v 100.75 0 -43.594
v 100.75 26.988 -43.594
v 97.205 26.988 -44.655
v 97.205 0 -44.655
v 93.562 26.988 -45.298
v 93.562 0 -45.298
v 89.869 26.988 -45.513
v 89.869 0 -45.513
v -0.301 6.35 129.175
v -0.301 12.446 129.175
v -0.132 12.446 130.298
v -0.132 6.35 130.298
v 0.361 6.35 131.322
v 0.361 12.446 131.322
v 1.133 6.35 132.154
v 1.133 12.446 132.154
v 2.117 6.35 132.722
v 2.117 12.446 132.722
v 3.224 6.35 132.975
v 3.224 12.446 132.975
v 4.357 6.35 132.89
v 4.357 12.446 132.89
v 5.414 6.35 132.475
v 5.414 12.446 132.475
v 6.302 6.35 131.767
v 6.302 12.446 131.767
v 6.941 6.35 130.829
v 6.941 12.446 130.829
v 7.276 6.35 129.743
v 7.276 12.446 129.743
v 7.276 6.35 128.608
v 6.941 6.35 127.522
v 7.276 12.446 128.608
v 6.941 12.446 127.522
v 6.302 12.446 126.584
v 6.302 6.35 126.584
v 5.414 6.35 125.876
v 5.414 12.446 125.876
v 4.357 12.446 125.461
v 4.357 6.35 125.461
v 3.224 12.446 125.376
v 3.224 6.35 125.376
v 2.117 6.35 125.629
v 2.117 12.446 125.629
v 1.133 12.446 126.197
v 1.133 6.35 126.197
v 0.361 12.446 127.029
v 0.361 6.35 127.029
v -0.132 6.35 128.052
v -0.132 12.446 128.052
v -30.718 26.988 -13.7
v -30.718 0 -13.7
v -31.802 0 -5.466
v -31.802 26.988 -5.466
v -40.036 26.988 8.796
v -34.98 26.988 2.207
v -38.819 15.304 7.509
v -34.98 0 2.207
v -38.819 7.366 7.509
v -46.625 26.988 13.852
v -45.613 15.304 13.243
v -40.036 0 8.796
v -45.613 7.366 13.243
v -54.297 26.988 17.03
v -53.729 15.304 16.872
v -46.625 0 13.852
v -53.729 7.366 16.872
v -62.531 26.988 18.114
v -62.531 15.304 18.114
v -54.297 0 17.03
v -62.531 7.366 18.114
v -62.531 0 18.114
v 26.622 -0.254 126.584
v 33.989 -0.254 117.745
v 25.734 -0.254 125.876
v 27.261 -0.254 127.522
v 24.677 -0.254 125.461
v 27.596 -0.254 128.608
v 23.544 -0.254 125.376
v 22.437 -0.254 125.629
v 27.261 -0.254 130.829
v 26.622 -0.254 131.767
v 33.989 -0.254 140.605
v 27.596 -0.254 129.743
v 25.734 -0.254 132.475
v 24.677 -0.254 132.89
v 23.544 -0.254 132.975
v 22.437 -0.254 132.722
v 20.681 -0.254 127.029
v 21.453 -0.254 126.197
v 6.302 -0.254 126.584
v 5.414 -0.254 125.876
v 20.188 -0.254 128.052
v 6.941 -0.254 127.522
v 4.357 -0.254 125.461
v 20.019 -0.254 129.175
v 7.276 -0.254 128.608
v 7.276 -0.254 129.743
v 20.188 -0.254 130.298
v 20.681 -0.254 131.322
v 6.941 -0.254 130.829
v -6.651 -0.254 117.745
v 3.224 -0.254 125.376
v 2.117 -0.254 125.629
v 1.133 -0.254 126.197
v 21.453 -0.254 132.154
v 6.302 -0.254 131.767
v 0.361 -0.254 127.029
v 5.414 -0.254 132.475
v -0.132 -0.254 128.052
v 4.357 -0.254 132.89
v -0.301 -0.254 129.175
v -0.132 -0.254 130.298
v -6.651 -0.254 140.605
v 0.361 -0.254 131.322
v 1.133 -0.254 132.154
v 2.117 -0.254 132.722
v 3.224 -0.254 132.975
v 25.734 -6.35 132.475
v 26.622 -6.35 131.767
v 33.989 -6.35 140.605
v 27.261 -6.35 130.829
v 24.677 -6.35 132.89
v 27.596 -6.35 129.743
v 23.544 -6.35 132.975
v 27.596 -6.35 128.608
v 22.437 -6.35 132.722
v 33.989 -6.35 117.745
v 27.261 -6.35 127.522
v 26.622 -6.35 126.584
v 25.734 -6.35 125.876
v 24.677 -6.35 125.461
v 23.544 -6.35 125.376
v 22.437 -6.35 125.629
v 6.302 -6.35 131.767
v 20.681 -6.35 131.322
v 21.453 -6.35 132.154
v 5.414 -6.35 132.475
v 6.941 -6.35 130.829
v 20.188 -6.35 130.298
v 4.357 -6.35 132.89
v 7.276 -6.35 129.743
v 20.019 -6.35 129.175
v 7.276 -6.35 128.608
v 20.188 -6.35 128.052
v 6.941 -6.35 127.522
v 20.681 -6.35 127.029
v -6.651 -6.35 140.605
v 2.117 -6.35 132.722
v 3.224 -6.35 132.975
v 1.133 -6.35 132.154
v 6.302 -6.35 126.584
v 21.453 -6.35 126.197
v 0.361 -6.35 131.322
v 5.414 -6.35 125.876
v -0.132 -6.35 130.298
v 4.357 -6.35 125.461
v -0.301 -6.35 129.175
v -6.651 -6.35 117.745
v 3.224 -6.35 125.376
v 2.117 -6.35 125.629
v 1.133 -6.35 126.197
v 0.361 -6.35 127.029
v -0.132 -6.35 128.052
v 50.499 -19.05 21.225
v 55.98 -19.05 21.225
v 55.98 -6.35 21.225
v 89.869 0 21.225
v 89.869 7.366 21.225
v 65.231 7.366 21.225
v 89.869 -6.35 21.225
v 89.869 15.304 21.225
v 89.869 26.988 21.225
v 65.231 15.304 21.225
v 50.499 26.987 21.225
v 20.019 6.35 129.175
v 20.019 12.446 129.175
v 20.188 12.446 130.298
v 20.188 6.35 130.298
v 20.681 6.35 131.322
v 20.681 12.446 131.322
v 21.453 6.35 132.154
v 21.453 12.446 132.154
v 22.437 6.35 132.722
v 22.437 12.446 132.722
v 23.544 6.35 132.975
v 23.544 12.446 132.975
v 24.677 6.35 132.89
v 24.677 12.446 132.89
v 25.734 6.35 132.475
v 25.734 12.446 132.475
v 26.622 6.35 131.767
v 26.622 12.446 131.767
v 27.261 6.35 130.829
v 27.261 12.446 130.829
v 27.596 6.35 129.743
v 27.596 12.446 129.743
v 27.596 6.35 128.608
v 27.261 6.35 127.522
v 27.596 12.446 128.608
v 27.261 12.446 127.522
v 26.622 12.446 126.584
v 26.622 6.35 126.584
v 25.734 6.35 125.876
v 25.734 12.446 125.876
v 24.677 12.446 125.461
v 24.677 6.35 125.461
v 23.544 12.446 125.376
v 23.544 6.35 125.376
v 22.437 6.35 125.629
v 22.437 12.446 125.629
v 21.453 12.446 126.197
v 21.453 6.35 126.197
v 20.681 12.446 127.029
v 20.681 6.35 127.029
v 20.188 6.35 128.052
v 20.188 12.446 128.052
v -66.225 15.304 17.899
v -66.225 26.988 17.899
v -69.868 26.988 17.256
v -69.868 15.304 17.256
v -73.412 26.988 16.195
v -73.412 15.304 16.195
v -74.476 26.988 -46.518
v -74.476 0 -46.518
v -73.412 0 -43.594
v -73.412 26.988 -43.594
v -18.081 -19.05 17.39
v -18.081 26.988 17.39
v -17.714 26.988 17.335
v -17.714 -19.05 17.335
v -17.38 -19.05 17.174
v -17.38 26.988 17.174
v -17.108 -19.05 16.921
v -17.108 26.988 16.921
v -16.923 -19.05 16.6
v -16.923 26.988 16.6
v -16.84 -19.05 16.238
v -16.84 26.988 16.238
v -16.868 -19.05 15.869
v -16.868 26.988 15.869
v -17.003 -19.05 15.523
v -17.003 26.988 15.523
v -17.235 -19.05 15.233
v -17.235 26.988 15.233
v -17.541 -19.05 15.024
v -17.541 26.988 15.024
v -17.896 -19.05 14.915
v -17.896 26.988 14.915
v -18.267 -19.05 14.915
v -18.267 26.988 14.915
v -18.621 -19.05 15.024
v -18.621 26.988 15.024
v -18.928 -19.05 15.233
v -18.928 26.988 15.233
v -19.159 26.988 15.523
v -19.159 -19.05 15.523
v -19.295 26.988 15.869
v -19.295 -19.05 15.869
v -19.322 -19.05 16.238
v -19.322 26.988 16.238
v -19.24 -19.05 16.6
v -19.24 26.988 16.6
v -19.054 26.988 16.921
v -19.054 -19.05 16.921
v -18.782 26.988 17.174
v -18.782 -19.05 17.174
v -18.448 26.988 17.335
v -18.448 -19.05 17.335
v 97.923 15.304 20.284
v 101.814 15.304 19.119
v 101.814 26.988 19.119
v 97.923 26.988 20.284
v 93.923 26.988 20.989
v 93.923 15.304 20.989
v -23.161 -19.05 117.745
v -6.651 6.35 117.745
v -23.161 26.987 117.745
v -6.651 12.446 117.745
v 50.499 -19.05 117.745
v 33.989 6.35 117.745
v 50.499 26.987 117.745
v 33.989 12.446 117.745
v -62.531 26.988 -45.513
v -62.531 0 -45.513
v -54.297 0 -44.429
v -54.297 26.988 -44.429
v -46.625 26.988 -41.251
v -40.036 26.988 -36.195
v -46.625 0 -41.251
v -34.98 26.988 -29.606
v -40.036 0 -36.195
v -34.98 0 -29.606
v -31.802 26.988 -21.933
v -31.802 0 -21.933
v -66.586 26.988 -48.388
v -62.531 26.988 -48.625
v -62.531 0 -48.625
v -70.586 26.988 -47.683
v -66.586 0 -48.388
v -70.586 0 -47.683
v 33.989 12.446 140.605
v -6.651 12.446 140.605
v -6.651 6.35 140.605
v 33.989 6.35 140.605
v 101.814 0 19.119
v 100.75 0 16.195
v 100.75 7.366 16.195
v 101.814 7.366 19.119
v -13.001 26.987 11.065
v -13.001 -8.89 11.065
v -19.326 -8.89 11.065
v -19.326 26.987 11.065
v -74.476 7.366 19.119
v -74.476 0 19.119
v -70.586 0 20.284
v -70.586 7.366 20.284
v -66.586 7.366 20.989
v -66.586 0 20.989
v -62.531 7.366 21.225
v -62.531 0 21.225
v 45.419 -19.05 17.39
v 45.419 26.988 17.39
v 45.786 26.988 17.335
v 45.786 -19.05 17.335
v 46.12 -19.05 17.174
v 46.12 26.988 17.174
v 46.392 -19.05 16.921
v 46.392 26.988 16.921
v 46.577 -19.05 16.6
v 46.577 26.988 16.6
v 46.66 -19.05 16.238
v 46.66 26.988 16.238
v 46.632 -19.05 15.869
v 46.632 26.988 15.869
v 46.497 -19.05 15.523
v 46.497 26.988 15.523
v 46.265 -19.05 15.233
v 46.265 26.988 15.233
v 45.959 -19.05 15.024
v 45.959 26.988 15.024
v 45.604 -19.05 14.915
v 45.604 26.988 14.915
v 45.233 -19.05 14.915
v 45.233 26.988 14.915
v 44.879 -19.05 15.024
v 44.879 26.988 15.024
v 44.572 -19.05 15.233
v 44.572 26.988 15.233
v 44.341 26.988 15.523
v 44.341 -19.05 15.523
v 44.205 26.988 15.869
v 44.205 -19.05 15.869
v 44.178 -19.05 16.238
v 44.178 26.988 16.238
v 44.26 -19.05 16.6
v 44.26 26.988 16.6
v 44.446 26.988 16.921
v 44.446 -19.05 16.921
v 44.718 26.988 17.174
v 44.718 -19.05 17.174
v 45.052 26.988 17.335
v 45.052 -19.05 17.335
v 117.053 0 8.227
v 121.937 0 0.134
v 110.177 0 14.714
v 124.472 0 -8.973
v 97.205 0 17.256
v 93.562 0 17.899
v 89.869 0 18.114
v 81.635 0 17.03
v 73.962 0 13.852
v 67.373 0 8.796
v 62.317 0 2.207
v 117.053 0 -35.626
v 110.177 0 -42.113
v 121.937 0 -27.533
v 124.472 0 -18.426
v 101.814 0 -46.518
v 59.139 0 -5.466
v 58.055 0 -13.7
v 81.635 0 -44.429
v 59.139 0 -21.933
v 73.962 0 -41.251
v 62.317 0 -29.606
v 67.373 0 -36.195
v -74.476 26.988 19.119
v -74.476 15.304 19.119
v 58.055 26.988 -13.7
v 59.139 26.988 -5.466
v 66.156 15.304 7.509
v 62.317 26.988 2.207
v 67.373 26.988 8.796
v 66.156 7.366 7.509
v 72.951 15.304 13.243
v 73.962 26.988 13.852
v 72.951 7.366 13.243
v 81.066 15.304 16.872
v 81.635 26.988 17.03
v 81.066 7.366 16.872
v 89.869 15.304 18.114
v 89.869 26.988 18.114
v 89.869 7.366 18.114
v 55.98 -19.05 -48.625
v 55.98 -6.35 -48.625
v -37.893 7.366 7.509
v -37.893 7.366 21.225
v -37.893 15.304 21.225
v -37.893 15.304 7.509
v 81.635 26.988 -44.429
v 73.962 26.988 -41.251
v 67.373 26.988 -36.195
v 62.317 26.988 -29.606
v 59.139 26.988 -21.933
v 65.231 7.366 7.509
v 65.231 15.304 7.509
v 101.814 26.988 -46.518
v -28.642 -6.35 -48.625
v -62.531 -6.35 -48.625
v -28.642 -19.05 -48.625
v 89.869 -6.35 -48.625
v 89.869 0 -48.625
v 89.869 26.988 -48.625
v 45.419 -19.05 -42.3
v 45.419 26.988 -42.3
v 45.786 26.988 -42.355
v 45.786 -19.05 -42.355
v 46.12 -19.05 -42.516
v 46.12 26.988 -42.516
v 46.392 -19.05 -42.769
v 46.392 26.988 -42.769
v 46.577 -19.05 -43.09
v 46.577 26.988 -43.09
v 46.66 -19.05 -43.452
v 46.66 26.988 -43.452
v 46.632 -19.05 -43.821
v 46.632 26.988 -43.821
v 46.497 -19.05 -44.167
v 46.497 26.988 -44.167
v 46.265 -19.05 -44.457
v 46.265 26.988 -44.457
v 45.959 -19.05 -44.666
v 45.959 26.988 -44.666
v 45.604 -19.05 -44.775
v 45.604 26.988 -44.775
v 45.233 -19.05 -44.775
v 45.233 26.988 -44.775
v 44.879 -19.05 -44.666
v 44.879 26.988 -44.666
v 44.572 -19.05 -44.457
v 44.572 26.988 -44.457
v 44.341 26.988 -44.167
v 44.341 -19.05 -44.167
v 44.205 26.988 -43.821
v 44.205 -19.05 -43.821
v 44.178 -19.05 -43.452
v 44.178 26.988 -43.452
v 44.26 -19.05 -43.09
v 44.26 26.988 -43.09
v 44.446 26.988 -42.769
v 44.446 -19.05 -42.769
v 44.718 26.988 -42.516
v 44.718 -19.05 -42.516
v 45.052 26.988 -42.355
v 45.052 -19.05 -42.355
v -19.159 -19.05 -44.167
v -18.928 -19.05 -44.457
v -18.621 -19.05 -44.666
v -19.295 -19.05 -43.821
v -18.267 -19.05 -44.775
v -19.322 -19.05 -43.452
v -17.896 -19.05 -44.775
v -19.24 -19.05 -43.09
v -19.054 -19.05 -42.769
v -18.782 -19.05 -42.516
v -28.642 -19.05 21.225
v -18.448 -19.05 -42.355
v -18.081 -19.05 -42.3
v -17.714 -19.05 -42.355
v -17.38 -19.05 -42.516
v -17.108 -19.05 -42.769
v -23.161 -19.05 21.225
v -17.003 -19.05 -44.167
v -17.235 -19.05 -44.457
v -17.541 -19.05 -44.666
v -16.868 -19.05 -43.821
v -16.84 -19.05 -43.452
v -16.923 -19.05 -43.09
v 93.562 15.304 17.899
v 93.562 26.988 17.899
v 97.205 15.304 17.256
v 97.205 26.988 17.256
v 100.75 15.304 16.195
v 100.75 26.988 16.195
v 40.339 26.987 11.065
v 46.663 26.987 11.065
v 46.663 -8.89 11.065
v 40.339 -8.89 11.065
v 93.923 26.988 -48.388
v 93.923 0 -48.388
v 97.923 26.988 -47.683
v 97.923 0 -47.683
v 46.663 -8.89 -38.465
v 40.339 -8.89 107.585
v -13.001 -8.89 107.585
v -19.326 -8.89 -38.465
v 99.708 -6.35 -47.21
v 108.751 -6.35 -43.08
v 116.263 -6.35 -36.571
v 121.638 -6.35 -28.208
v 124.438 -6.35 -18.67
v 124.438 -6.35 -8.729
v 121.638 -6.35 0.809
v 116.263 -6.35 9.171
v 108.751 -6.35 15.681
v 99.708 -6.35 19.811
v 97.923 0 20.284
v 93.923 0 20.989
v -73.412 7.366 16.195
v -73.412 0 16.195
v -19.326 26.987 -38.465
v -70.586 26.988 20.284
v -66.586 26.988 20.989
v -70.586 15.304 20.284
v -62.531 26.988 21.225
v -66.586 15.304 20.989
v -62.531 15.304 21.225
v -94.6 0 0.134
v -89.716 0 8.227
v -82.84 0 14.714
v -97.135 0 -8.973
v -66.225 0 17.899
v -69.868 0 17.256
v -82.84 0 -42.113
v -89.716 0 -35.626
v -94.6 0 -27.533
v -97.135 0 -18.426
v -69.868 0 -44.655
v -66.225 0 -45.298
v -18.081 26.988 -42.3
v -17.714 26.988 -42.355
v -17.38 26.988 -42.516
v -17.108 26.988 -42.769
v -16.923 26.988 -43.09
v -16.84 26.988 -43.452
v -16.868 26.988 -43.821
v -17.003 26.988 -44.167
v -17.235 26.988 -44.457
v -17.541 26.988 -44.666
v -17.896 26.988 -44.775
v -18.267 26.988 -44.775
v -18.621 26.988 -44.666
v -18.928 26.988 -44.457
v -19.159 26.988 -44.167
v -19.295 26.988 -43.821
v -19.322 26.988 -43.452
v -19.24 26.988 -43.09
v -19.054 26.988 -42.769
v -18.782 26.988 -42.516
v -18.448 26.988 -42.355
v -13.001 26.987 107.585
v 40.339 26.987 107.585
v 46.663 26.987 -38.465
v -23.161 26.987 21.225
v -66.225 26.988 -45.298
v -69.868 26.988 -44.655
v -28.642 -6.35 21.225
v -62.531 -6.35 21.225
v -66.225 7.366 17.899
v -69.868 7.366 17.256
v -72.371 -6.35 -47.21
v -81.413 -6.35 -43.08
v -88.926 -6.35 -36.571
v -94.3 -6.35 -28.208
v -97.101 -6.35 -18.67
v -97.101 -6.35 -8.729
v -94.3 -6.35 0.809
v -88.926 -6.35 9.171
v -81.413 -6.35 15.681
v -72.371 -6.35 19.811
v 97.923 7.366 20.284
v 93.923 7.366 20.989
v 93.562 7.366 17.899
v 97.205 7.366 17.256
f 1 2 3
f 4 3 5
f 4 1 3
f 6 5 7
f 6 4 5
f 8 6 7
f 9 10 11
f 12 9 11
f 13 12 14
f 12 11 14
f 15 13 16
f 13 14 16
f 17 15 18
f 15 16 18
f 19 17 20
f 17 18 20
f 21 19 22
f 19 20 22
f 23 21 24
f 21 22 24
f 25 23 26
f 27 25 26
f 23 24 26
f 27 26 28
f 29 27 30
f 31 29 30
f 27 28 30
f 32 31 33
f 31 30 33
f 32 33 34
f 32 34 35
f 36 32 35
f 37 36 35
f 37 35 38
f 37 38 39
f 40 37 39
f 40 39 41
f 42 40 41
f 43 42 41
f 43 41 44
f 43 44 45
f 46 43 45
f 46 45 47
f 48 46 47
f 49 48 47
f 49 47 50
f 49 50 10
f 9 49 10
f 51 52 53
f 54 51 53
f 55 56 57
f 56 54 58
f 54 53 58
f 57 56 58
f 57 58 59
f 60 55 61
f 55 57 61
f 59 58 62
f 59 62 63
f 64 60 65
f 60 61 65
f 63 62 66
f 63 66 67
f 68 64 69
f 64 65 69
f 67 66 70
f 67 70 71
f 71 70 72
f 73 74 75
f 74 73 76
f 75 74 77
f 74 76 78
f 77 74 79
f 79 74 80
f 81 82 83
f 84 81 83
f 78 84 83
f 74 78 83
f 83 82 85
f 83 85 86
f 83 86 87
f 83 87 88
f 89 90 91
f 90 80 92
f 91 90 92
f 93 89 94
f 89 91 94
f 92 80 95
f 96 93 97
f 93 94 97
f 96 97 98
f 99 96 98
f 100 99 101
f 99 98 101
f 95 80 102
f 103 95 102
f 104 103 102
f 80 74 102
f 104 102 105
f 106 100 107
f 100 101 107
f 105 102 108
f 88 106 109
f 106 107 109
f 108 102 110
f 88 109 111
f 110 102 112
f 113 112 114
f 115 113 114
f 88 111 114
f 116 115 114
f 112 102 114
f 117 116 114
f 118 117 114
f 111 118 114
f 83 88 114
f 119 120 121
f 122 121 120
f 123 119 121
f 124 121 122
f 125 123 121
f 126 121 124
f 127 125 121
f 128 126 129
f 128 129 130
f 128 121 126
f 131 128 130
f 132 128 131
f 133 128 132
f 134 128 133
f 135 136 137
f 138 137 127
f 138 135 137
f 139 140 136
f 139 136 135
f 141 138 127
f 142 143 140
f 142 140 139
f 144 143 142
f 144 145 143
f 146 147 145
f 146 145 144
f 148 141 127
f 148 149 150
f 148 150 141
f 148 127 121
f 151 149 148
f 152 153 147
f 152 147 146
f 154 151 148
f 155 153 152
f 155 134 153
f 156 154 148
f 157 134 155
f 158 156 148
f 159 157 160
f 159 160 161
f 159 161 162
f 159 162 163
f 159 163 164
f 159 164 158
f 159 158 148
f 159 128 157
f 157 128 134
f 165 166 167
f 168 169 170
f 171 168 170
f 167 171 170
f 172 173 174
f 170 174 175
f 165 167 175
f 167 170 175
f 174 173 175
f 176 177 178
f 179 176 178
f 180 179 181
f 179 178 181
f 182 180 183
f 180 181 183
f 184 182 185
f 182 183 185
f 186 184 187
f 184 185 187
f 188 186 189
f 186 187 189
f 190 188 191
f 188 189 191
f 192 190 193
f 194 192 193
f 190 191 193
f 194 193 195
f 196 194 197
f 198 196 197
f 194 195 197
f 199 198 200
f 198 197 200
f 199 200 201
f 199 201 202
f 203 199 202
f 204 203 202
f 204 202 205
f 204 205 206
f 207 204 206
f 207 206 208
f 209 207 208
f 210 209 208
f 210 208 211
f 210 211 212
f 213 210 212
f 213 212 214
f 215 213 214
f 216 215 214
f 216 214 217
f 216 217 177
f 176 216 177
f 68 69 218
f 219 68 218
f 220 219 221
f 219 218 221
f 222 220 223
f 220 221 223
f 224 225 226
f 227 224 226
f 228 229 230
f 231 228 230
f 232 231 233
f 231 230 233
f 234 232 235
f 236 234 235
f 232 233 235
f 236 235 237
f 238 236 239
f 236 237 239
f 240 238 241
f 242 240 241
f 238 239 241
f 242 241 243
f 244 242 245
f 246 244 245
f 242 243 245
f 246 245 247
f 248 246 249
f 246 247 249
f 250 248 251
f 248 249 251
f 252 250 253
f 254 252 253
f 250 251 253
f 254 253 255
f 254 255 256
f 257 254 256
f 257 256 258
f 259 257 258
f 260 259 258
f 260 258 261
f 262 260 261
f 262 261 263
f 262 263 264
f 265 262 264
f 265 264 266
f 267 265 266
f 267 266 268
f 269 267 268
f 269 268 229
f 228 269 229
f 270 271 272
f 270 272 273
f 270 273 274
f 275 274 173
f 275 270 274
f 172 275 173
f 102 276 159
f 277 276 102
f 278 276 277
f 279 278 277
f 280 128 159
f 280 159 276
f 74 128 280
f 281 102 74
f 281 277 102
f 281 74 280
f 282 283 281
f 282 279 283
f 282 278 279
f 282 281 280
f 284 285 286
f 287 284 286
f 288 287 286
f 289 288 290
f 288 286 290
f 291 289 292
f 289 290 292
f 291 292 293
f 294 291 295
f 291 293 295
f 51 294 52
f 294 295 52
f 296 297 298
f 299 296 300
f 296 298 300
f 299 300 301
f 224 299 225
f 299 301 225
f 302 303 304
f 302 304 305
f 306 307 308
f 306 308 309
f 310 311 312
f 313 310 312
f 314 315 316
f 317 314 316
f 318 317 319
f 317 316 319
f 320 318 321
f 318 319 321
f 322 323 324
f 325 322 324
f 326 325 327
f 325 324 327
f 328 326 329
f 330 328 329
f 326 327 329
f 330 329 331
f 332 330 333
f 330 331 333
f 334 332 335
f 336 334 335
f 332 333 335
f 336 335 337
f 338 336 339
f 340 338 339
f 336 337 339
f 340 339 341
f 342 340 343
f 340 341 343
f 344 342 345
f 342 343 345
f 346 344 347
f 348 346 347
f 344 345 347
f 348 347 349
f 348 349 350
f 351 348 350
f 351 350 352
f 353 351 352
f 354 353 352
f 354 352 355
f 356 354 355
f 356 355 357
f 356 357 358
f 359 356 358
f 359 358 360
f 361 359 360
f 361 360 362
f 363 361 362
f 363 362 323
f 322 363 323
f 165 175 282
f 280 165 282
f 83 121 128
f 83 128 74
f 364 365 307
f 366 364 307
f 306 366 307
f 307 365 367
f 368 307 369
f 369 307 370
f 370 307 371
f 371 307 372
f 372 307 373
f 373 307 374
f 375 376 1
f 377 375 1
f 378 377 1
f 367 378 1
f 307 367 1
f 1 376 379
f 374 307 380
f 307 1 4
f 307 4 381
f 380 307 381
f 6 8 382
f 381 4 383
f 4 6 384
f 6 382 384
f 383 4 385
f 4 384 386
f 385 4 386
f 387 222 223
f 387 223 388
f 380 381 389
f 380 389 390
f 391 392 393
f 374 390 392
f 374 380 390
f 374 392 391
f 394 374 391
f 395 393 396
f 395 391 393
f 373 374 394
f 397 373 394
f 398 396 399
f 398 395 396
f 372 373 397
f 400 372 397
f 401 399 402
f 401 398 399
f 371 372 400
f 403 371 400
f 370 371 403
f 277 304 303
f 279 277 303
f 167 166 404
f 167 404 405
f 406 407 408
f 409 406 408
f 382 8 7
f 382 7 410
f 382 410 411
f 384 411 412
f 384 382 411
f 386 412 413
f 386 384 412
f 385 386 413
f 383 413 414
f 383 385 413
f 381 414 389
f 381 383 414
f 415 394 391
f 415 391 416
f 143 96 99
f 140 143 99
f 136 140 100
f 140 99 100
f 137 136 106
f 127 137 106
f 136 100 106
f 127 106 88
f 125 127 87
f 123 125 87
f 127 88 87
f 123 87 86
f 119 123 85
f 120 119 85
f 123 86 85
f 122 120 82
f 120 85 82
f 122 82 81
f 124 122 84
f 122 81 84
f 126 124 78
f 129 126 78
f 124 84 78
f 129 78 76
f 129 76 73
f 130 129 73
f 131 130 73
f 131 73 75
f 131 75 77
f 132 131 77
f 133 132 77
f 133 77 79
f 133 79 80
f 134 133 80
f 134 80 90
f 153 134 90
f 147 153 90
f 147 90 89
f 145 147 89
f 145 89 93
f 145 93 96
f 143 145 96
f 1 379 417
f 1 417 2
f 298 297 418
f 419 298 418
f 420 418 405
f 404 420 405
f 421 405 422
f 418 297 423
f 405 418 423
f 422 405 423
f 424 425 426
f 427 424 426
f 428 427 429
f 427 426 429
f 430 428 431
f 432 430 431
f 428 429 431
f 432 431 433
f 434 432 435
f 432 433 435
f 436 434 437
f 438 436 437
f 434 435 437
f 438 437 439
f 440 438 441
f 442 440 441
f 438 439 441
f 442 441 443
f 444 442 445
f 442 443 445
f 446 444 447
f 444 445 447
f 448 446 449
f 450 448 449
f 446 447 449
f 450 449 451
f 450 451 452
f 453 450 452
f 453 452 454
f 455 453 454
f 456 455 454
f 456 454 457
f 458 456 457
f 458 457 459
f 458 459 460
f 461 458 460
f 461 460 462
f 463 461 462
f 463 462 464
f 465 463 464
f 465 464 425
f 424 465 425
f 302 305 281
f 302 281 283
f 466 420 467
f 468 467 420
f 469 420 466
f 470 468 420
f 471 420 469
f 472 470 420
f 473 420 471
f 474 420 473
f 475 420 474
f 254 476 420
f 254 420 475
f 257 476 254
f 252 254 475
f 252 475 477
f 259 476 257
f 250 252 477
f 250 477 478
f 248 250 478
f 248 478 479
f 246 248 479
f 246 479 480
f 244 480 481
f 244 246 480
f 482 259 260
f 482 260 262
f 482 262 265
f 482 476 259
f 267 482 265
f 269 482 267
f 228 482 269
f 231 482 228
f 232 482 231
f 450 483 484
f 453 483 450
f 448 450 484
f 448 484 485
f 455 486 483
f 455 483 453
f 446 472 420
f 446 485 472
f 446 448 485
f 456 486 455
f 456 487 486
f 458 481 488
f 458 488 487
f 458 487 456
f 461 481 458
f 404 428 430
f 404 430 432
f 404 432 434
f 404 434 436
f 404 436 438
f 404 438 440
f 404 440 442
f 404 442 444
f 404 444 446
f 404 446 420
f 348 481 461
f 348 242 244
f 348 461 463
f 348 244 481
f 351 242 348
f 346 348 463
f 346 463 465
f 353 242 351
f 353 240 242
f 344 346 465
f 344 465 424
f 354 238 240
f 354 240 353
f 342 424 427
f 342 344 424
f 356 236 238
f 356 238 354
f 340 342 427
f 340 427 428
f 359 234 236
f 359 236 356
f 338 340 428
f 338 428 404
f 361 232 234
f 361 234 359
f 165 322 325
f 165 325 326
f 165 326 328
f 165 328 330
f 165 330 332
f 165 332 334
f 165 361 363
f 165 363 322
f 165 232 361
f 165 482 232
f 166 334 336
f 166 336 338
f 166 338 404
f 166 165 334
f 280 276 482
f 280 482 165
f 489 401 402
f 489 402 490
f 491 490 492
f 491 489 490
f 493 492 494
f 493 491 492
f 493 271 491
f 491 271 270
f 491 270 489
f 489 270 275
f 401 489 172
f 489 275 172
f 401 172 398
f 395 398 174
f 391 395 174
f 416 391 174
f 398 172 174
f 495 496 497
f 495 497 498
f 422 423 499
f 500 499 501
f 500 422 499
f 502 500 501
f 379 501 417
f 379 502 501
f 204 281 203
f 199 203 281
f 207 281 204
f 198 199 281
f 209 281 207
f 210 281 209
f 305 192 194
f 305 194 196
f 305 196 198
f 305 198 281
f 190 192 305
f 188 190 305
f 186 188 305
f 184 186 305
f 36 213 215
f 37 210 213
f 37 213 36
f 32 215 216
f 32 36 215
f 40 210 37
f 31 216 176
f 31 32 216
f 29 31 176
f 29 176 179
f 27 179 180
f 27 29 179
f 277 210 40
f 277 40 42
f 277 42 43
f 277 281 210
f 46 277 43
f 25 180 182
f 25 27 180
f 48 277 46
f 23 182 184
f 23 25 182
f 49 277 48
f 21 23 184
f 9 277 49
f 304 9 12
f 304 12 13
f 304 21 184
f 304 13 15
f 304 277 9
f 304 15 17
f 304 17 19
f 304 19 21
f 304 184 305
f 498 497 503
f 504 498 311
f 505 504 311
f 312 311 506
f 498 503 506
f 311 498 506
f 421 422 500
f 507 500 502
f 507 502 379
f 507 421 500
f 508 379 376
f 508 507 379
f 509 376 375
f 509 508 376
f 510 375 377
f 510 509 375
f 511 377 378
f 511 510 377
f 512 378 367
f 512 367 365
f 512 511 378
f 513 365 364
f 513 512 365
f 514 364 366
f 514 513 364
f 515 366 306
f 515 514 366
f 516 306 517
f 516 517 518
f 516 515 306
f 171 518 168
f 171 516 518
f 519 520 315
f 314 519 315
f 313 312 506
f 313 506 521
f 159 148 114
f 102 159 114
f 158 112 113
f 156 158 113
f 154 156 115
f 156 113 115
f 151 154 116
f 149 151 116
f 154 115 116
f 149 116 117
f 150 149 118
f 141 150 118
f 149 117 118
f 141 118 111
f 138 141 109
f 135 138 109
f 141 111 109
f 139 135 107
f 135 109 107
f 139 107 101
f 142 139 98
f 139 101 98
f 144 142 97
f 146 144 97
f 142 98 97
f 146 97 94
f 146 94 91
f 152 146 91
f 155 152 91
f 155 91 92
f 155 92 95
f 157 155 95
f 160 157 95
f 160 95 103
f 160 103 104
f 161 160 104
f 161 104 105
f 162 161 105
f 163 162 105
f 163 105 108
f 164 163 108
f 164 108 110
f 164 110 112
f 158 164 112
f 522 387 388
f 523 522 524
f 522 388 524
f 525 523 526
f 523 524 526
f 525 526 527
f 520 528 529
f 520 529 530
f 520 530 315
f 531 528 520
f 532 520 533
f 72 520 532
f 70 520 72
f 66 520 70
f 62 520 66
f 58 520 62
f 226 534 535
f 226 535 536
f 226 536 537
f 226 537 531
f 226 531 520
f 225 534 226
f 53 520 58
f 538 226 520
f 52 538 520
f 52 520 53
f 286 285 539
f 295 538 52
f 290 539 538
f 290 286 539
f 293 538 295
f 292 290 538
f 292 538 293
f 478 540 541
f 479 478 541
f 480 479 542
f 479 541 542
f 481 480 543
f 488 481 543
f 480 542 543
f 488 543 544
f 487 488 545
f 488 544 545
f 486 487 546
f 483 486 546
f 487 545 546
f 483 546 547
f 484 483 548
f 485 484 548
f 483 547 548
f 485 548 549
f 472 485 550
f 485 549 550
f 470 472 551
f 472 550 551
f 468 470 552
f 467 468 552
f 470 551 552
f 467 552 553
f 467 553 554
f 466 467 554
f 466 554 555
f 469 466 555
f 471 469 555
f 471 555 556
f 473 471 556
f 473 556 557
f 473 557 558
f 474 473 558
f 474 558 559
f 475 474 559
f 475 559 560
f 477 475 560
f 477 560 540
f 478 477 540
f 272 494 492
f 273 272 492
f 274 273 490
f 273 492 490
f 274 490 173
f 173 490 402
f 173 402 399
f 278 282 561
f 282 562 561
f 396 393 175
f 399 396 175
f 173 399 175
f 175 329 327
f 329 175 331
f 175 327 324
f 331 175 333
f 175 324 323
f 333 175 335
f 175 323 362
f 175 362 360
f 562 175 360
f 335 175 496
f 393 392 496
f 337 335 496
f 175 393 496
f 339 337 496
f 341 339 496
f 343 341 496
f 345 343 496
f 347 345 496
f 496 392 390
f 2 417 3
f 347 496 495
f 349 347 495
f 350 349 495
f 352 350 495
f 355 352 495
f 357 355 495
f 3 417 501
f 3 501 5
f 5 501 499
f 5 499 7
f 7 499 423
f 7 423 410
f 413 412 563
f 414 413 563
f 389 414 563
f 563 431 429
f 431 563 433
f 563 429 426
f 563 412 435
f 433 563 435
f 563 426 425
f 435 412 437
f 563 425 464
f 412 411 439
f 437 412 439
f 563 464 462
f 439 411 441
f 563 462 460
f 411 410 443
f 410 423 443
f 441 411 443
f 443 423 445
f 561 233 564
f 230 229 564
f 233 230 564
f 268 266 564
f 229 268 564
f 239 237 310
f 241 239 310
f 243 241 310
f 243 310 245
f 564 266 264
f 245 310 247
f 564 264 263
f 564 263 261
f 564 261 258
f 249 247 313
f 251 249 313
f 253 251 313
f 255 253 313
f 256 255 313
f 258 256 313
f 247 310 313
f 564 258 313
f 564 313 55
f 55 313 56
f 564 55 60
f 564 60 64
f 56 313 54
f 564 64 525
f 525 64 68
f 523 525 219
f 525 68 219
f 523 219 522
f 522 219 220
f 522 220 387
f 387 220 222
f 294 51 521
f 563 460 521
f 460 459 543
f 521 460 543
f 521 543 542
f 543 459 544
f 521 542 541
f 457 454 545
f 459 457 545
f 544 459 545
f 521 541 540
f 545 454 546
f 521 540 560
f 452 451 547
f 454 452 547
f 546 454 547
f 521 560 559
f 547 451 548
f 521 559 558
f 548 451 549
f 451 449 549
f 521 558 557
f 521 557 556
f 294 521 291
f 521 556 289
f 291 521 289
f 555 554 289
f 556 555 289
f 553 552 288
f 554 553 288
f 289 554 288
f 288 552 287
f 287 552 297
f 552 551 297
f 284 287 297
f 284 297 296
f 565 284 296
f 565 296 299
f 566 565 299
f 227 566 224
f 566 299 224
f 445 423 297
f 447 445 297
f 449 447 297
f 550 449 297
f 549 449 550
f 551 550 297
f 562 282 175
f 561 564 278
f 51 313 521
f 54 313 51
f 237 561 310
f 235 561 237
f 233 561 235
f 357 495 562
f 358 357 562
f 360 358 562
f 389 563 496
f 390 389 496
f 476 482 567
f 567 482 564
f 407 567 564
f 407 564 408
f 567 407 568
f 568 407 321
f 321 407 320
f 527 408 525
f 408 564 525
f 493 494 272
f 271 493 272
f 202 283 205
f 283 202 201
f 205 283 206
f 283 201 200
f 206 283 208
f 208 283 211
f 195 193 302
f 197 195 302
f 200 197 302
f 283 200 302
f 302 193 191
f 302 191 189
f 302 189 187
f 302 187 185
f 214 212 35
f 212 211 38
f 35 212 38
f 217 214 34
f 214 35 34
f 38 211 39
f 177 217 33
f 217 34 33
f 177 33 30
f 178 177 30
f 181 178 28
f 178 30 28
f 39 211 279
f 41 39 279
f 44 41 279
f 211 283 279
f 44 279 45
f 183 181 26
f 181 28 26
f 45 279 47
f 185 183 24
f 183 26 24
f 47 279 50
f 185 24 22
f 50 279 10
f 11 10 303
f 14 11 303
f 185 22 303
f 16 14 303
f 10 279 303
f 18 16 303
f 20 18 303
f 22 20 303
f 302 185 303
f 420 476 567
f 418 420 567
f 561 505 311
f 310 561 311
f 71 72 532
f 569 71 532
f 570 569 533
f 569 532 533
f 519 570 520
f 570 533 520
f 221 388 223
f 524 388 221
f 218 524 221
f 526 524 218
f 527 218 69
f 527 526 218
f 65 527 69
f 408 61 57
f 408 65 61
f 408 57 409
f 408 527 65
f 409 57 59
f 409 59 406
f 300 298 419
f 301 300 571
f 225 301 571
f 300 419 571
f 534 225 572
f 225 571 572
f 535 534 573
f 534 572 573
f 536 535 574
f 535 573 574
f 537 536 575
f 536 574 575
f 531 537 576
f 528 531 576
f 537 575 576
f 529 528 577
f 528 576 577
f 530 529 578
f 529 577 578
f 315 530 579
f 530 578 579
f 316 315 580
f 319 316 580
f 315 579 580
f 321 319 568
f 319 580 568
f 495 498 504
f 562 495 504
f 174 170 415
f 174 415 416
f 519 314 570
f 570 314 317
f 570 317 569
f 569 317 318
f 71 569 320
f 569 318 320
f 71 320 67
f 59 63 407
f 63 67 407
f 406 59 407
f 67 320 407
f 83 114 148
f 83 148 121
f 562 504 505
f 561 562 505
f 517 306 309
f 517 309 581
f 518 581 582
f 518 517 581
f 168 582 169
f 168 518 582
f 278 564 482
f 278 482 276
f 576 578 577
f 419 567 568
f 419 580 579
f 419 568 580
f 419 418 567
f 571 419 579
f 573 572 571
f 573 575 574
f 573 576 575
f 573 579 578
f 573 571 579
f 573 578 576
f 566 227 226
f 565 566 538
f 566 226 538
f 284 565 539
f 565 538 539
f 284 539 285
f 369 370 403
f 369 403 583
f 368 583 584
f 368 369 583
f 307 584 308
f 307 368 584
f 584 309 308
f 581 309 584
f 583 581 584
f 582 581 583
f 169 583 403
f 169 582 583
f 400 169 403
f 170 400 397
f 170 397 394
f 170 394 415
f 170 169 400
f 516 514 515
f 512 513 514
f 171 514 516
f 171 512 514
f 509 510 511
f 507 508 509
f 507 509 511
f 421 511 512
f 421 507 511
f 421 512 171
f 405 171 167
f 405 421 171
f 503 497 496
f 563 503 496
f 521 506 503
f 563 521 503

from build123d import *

# Parameters (mm, degrees)
BOSS_EXTRUDE1_DEPTH  = 26.9875
BOSS_EXTRUDE5_START  = -6.35
BOSS_EXTRUDE5_DEPTH  = 6.35
SKETCH3_W            = 36.83
SKETCH3_H            = 33.3375
BOSS_EXTRUDE7_DEPTH  = 96.52
SKETCH6_W            = 20.32
SKETCH6_H            = 33.3375
BOSS_EXTRUDE8_DEPTH  = 22.86
SKETCH7_W            = 22.86
SKETCH7_H            = 14.5415
SKETCH7_H_2          = 6.604
CUT_EXTRUDE1_DEPTH   = 21.082
SKETCH11_W           = 39.850701562
SKETCH11_H           = 7.9375
CUT_EXTRUDE3_DEPTH   = 13.716
SHELL1_START         = 3.81
SHELL1_DEPTH         = 23.1775
SHELL1_START_2       = 25.4635
SHELL1_2_DEPTH       = 1.524
SKETCH16_W           = 73.66
SKETCH16_H           = 166.37
BOSS_EXTRUDE9_DEPTH  = 12.7
CUT_EXTRUDE6_START   = -12.7
CUT_EXTRUDE6_DEPTH   = 12.7
SKETCH13_R           = 1.2446
CUT_EXTRUDE4_DEPTH   = 50.8
SKETCH20_W           = 61.160461962
SKETCH20_H           = 49.53
CUT_EXTRUDE8_DEPTH   = 35.8775
BOSS_EXTRUDE16_START = -69.85
SKETCH21_W           = 9.316323924
SKETCH21_H           = 46.0375
SKETCH21_W_2         = 9.316323925
BOSS_EXTRUDE16_DEPTH = 69.85
SKETCH22_W           = 22.86
SKETCH22_H           = 14.5415
SKETCH22_H_2         = 6.604
CUT_EXTRUDE9_DEPTH   = 19.558
SKETCH23_R           = 3.81
CUT_EXTRUDE10_DEPTH  = 36.068


# Read off the part's stored shape, not the designer's step: Shell1
with BuildPart() as part:
    # Sketch1 → Boss-Extrude1 (new body)
    with BuildSketch(Plane(origin=(0, 0, 0), x_dir=(1, 0, 0), z_dir=(0, 1, 0))):
        with BuildLine():
            ThreePointArc((-27.606252307, 13.699523808), (-37.835547974, 38.395228141), (-62.531252307, 48.624523808))
            Line((-62.531252307, 48.624523808), (-62.531252307, 45.513023808))
            ThreePointArc((-62.531252307, 45.513023808), (-40.035710723, 36.195065391), (-30.717752307, 13.699523808))
            ThreePointArc((-30.717752307, 13.699523808), (-40.035710723, -8.796017775), (-62.531252307, -18.113976192))
            Line((-62.531252307, -18.113976192), (-62.531252307, -21.225476192))
            ThreePointArc((-62.531252307, -21.225476192), (-37.835547974, -10.996180525), (-27.606252307, 13.699523808))
        make_face()
        with BuildLine():
            Line((-62.531252307, 45.513023808), (-62.531252307, 48.624523808))
            ThreePointArc((-62.531252307, 48.624523808), (-68.595914912, 48.093934582), (-74.476305812, 46.518288589))
            Line((-74.476305812, 46.518288589), (-73.412110136, 43.594434999))
            ThreePointArc((-73.412110136, 43.594434999), (-68.055608607, 45.029705258), (-62.531252307, 45.513023808))
        make_face()
        with BuildLine():
            ThreePointArc((-74.476305812, -19.119240973), (-68.595914912, -20.694886966), (-62.531252307, -21.225476192))
            Line((-62.531252307, -21.225476192), (-62.531252307, -18.113976192))
            ThreePointArc((-62.531252307, -18.113976192), (-68.055608607, -17.630657643), (-73.412110136, -16.195387383))
            Line((-73.412110136, -16.195387383), (-74.476305812, -19.119240973))
        make_face()
        with BuildLine():
            Line((13.668747693, 48.624523808), (-62.531252307, 48.624523808))
            ThreePointArc((-62.531252307, 48.624523808), (-37.835547974, 38.395228141), (-27.606252307, 13.699523808))
            ThreePointArc((-27.606252307, 13.699523808), (-37.835547974, -10.996180525), (-62.531252307, -21.225476192))
            Line((-62.531252307, -21.225476192), (13.668747693, -21.225476192))
            Line((13.668747693, -21.225476192), (13.668747693, 48.624523808))
        make_face()
    boss_extrude1 = extrude(amount=BOSS_EXTRUDE1_DEPTH)

    # Sketch1<5> → Boss-Extrude5 (add)
    with BuildSketch(Plane(origin=(0, 0, 0), x_dir=(1, 0, 0), z_dir=(0, 1, 0)).offset(BOSS_EXTRUDE5_START)):
        with BuildLine():
            Line((-62.531252307, -21.225476192), (13.668747693, -21.225476192))
            Line((13.668747693, -21.225476192), (13.668747693, 48.624523808))
            Line((13.668747693, 48.624523808), (-62.531252307, 48.624523808))
            ThreePointArc((-62.531252307, 48.624523808), (-97.456252307, 13.699523808), (-62.531252307, -21.225476192))
        make_face()
    boss_extrude5 = extrude(amount=BOSS_EXTRUDE5_DEPTH)

    # Mirror1: Boss-Extrude1, Boss-Extrude5 across plane
    add(boss_extrude1.mirror(Plane(origin=(13.668747693, 26.9875, 0), x_dir=(0, 0, 1), z_dir=(1, 0, 0))))
    add(boss_extrude5.mirror(Plane(origin=(13.668747693, 26.9875, 0), x_dir=(0, 0, 1), z_dir=(1, 0, 0))))

    # Sketch3 → Boss-Extrude7 (add)
    with BuildSketch(Plane.XY.offset(21.225476192)):
        with Locations((-4.746252307, 10.31875)):
            Rectangle(SKETCH3_W, SKETCH3_H)
        with Locations((32.083747693, 10.31875)):
            Rectangle(SKETCH3_W, SKETCH3_H)
    extrude(amount=BOSS_EXTRUDE7_DEPTH)

    # Sketch6 → Boss-Extrude8 (add)
    with BuildSketch(Plane.XY.offset(117.745476192)):
        with Locations((3.508747693, 10.31875)):
            Rectangle(SKETCH6_W, SKETCH6_H)
        with Locations((23.828747693, 10.31875)):
            Rectangle(SKETCH6_W, SKETCH6_H)
    extrude(amount=BOSS_EXTRUDE8_DEPTH)

    # Sketch7 → Cut-Extrude1 (cut)
    with BuildSketch(Plane.ZY.offset(6.651252307)):
        with Locations((129.175476192, 19.71675)):
            Rectangle(SKETCH7_W, SKETCH7_H)
        with Locations((129.175476192, 3.048)):
            Rectangle(SKETCH7_W, SKETCH7_H_2)
    extrude(amount=-CUT_EXTRUDE1_DEPTH, mode=Mode.SUBTRACT)

    # Sketch11 → Cut-Extrude3 (cut)
    with BuildSketch(Plane.XY.offset(21.225476192)):
        with Locations((-57.818603088, 11.33475)):
            Rectangle(SKETCH11_W, SKETCH11_H)
    cut_extrude3 = extrude(amount=-CUT_EXTRUDE3_DEPTH, mode=Mode.SUBTRACT)

    # Mirror2: Cut-Extrude3 across plane
    add(cut_extrude3.mirror(Plane.ZY.offset(-13.668747693)), mode=Mode.SUBTRACT)

    # Shell1 outline → Shell1 (cut)
    with BuildSketch(Plane(origin=(0, 0, 0), x_dir=(1, 0, 0), z_dir=(0, 1, 0)).offset(SHELL1_START)):
        with BuildLine():
            Line((-27.733252307, -9.771179169), (-27.733252307, -11.065476192))
            Line((-27.733252307, -11.065476192), (-13.001252307, -11.065476192))
            Line((-13.001252307, -11.065476192), (-13.001252307, -107.585476192))
            Line((-13.001252307, -107.585476192), (40.338747693, -107.585476192))
            Line((40.338747693, -107.585476192), (40.338747693, -11.065476192))
            Line((40.338747693, -11.065476192), (55.070747693, -11.065476192))
            Line((55.070747693, -11.065476192), (55.070747693, -9.771179169))
            ThreePointArc((55.070747693, -9.771179169), (47.902697541, 14.49030625), (55.979671618, 38.464523808))
            Line((55.979671618, 38.464523808), (-28.642176231, 38.464523808))
            ThreePointArc((-28.642176231, 38.464523808), (-20.565202155, 14.49030625), (-27.733252307, -9.771179169))
        make_face()
    extrude(amount=SHELL1_DEPTH, mode=Mode.SUBTRACT)

    # Shell1 2 outline → Shell1 2 (cut)
    with BuildSketch(Plane(origin=(0, 0, 0), x_dir=(1, 0, 0), z_dir=(0, 1, 0)).offset(SHELL1_START_2)):
        with BuildLine():
            ThreePointArc((-27.733252307, -9.771179169), (-28.181617576, -10.422609102), (-28.642176231, -11.065476192))
            Line((-28.642176231, -11.065476192), (-27.733252307, -11.065476192))
            Line((-27.733252307, -11.065476192), (-27.733252307, -9.771179169))
        make_face()
        with BuildLine():
            ThreePointArc((55.979671618, -11.065476192), (55.519112962, -10.422609101), (55.070747693, -9.771179169))
            Line((55.070747693, -9.771179169), (55.070747693, -11.065476192))
            Line((55.070747693, -11.065476192), (55.979671618, -11.065476192))
        make_face()
    extrude(amount=SHELL1_2_DEPTH, mode=Mode.SUBTRACT)

    # Sketch16 → Boss-Extrude9 (add)
    with BuildSketch(Plane.XZ.offset(6.35)):
        with Locations((13.668747693, 34.560476192)):
            Rectangle(SKETCH16_W, SKETCH16_H)
    extrude(amount=BOSS_EXTRUDE9_DEPTH)

    # Sketch17 → Cut-Extrude6 (cut)
    with BuildSketch(Plane(origin=(0, 3.81, 0), x_dir=(1, 0, 0), z_dir=(0, 1, 0)).offset(CUT_EXTRUDE6_START)):
        with BuildLine():
            Line((-28.642176231, 38.464523808), (55.979671618, 38.464523808))
            ThreePointArc((55.979671618, 38.464523808), (47.895247693, 13.699523808), (55.979671618, -11.065476192))
            Line((55.979671618, -11.065476192), (40.338747693, -11.065476192))
            Line((40.338747693, -11.065476192), (40.338747693, -107.585476192))
            Line((40.338747693, -107.585476192), (-13.001252307, -107.585476192))
            Line((-13.001252307, -107.585476192), (-13.001252307, -11.065476192))
            Line((-13.001252307, -11.065476192), (-28.642176231, -11.065476192))
            ThreePointArc((-28.642176231, -11.065476192), (-20.557752307, 13.699523808), (-28.642176231, 38.464523808))
        make_face()
    extrude(amount=CUT_EXTRUDE6_DEPTH, mode=Mode.SUBTRACT)

    # Sketch13 → Cut-Extrude4 (cut)
    with BuildSketch(Plane(origin=(0, 26.9875, 0), x_dir=(1, 0, 0), z_dir=(0, 1, 0))):
        with Locations(Location((45.418747693, -16.145476192, 0), (0, 0, 270))):
            Circle(SKETCH13_R)
        with Locations(Location((-18.081252307, -16.145476192, 0), (0, 0, 270))):
            Circle(SKETCH13_R)
        with Locations(Location((-18.081252307, 43.544523808, 0), (0, 0, 270))):
            Circle(SKETCH13_R)
        with Locations(Location((45.418747693, 43.544523808, 0), (0, 0, 270))):
            Circle(SKETCH13_R)
    extrude(amount=-CUT_EXTRUDE4_DEPTH, mode=Mode.SUBTRACT)

    # Sketch20 → Cut-Extrude8 (cut)
    with BuildSketch(Plane(origin=(0, 26.9875, 0), x_dir=(1, 0, 0), z_dir=(0, 1, 0))):
        with Locations((17.578978674, 13.699523808)):
            Rectangle(SKETCH20_W, SKETCH20_H)
    extrude(amount=-CUT_EXTRUDE8_DEPTH, mode=Mode.SUBTRACT)

    # Sketch21 → Boss-Extrude16 (add)
    with BuildSketch(Plane(origin=(0, 0, -48.624523808), x_dir=(-1, 0, 0), z_dir=(0, 0, -1)).offset(BOSS_EXTRUDE16_START)):
        with Locations((23.984014269, 3.96875)):
            Rectangle(SKETCH21_W, SKETCH21_H)
        with Locations((-51.321509656, 3.96875)):
            Rectangle(SKETCH21_W_2, SKETCH21_H)
    extrude(amount=BOSS_EXTRUDE16_DEPTH)

    # Sketch22 → Cut-Extrude9 (cut)
    with BuildSketch(Plane.ZY.offset(-14.430747693)):
        with Locations((129.175476192, 19.71675)):
            Rectangle(SKETCH22_W, SKETCH22_H)
        with Locations((129.175476192, 3.048)):
            Rectangle(SKETCH22_W, SKETCH22_H_2)
    extrude(amount=-CUT_EXTRUDE9_DEPTH, mode=Mode.SUBTRACT)

    # Sketch23 → Cut-Extrude10 (cut)
    with BuildSketch(Plane(origin=(0, 12.446, 0), x_dir=(1, 0, 0), z_dir=(0, 1, 0))):
        with Locations(Location((3.508747693, -129.175476192, 0), (0, 0, 180))):
            Circle(SKETCH23_R)
        with Locations(Location((23.828747693, -129.175476192, 0), (0, 0, 180))):
            Circle(SKETCH23_R)
    extrude(amount=-CUT_EXTRUDE10_DEPTH, mode=Mode.SUBTRACT)


solid = part.part
